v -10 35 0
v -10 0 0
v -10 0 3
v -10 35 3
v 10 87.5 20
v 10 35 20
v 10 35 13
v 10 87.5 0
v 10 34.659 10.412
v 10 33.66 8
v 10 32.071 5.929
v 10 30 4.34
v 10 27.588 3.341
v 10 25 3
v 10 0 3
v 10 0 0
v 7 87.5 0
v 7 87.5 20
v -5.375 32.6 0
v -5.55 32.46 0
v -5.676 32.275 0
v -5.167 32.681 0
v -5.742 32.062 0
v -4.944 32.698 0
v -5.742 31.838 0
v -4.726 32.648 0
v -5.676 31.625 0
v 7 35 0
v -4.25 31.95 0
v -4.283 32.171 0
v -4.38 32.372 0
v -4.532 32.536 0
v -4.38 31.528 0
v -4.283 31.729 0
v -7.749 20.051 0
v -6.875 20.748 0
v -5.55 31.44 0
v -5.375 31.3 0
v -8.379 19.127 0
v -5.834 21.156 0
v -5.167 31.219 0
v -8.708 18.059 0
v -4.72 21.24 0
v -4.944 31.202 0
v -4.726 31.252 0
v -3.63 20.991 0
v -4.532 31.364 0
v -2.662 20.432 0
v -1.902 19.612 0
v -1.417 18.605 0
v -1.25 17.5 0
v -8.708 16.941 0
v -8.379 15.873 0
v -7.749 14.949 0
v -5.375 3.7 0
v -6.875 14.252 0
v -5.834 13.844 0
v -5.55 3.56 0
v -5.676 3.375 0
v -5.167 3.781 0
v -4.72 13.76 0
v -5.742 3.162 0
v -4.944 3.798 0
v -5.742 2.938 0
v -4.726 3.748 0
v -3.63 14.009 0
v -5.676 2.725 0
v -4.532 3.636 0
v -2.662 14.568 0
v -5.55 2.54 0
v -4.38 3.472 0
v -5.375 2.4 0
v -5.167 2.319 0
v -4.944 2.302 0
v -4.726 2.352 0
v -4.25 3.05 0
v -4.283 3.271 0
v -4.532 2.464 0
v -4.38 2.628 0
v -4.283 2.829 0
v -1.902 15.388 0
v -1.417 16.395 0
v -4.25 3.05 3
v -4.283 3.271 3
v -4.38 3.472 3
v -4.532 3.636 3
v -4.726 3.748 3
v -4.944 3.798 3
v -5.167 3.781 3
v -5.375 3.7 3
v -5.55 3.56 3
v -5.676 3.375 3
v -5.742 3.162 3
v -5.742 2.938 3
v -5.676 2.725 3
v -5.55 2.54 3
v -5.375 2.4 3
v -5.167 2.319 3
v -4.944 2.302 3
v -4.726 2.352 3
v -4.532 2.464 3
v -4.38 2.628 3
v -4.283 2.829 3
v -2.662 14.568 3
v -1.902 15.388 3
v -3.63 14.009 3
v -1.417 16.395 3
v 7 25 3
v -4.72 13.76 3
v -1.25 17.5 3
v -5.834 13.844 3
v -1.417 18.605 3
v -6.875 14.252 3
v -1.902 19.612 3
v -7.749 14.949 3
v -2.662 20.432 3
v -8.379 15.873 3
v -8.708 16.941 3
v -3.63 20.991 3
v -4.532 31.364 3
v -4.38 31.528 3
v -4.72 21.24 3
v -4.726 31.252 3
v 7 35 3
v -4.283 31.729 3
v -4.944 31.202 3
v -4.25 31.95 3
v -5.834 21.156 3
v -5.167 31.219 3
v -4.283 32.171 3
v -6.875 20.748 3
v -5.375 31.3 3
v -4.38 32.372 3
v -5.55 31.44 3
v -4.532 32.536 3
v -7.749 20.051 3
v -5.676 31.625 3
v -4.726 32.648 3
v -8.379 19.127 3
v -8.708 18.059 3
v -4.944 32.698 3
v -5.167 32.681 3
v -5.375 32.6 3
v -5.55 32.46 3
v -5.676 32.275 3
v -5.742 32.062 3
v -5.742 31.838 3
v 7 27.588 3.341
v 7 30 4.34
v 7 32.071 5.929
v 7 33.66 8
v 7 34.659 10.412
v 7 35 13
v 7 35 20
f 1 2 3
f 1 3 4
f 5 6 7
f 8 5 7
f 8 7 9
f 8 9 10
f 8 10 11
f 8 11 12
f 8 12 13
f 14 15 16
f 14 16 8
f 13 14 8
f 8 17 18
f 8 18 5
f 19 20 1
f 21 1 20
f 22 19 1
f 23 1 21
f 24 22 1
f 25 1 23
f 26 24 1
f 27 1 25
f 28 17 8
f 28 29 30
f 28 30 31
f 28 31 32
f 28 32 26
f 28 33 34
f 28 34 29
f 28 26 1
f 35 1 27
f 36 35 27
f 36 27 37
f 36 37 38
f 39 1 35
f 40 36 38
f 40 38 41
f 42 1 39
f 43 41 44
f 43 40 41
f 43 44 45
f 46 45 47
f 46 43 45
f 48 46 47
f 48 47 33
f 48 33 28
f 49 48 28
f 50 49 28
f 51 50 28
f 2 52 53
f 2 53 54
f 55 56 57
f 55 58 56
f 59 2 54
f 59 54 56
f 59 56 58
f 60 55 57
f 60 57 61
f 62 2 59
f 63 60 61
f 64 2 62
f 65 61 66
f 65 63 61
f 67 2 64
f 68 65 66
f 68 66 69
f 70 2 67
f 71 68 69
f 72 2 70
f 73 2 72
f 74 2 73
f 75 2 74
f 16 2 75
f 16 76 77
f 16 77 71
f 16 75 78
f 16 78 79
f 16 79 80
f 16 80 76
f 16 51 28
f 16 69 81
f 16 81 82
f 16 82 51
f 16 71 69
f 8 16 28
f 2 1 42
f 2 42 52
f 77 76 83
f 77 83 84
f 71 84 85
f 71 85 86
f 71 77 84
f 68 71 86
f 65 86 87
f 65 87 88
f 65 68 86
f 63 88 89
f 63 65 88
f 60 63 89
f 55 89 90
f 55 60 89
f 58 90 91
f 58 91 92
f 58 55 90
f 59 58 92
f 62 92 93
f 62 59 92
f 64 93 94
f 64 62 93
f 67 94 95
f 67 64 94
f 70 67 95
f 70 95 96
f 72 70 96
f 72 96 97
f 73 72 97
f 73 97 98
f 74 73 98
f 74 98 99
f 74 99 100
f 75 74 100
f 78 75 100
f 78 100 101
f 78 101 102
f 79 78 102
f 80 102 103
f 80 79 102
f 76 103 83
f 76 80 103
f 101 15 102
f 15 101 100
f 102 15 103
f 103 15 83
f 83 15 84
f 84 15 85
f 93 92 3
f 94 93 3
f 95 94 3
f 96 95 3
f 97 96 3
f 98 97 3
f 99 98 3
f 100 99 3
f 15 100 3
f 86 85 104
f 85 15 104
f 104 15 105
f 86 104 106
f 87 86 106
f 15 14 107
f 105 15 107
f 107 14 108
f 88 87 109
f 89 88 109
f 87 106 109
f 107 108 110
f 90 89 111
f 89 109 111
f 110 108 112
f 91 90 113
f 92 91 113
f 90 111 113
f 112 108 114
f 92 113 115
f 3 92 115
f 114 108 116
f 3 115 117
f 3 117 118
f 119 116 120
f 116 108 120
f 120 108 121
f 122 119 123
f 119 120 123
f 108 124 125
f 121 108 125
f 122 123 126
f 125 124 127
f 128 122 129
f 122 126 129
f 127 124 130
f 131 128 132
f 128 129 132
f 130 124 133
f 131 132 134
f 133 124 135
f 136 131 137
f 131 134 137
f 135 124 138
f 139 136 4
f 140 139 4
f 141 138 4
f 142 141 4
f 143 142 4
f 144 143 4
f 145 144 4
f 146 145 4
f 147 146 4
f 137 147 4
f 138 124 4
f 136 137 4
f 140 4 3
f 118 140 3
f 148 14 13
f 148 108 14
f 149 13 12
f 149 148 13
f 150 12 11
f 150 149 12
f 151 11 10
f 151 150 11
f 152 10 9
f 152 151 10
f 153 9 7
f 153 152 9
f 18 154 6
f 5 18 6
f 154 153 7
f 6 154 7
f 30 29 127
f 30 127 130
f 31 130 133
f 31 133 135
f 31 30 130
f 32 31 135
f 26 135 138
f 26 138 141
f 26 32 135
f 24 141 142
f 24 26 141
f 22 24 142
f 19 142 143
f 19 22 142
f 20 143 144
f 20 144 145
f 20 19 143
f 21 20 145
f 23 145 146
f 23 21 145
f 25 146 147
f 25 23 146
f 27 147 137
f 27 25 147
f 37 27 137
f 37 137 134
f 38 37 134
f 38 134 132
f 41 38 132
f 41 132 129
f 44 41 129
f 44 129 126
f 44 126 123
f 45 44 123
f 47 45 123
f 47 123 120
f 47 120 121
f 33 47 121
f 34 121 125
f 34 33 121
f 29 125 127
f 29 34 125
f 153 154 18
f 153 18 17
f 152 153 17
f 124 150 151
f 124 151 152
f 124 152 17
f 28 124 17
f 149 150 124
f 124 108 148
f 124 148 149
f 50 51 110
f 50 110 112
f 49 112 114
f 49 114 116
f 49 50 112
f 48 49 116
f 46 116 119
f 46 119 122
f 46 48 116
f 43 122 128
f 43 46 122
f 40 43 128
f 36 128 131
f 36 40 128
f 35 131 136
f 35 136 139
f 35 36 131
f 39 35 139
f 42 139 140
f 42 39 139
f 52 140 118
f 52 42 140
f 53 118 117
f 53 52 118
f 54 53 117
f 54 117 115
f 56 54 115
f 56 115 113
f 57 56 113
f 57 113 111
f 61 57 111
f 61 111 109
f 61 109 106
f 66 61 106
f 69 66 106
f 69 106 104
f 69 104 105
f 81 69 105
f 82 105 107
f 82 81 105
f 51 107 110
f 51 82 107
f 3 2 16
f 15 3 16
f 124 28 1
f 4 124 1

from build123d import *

# Parameters (mm, degrees)
SKETCH1_R           = 0.75
SKETCH1_R_2         = 3.75
BOSS_EXTRUDE1_DEPTH = 3
SKETCH2_W           = 3
SKETCH2_H           = 20
BOSS_EXTRUDE2_DEPTH = 52.5
FILLET5_R           = 10


with BuildPart() as part:
    # Sketch1 → Boss-Extrude1 (new body)
    with BuildSketch(Plane.XY):
        Polygon((0, 0), (-10, 0), (-10, 35), (0, 35), (10, 35), (10, 0), align=None)
        with Locations((-5, 31.95)):
            Circle(SKETCH1_R, mode=Mode.SUBTRACT)
        with Locations((-5, 3.05)):
            Circle(SKETCH1_R, mode=Mode.SUBTRACT)
        with Locations((-5, 17.5)):
            Circle(SKETCH1_R_2, mode=Mode.SUBTRACT)
    extrude(amount=BOSS_EXTRUDE1_DEPTH)

    # Sketch2 → Boss-Extrude2 (add)
    with BuildSketch(Plane(origin=(0, 35, 0), x_dir=(1, 0, 0), z_dir=(0, 1, 0))):
        with Locations((8.5, -10)):
            Rectangle(SKETCH2_W, SKETCH2_H)
    extrude(amount=BOSS_EXTRUDE2_DEPTH)

    # Fillet5
    fillet5_edges = [part.edges().sort_by_distance(p)[0] for p in [
        (8.5, 35, 3),
    ]]
    fillet(fillet5_edges, radius=FILLET5_R)


solid = part.part
